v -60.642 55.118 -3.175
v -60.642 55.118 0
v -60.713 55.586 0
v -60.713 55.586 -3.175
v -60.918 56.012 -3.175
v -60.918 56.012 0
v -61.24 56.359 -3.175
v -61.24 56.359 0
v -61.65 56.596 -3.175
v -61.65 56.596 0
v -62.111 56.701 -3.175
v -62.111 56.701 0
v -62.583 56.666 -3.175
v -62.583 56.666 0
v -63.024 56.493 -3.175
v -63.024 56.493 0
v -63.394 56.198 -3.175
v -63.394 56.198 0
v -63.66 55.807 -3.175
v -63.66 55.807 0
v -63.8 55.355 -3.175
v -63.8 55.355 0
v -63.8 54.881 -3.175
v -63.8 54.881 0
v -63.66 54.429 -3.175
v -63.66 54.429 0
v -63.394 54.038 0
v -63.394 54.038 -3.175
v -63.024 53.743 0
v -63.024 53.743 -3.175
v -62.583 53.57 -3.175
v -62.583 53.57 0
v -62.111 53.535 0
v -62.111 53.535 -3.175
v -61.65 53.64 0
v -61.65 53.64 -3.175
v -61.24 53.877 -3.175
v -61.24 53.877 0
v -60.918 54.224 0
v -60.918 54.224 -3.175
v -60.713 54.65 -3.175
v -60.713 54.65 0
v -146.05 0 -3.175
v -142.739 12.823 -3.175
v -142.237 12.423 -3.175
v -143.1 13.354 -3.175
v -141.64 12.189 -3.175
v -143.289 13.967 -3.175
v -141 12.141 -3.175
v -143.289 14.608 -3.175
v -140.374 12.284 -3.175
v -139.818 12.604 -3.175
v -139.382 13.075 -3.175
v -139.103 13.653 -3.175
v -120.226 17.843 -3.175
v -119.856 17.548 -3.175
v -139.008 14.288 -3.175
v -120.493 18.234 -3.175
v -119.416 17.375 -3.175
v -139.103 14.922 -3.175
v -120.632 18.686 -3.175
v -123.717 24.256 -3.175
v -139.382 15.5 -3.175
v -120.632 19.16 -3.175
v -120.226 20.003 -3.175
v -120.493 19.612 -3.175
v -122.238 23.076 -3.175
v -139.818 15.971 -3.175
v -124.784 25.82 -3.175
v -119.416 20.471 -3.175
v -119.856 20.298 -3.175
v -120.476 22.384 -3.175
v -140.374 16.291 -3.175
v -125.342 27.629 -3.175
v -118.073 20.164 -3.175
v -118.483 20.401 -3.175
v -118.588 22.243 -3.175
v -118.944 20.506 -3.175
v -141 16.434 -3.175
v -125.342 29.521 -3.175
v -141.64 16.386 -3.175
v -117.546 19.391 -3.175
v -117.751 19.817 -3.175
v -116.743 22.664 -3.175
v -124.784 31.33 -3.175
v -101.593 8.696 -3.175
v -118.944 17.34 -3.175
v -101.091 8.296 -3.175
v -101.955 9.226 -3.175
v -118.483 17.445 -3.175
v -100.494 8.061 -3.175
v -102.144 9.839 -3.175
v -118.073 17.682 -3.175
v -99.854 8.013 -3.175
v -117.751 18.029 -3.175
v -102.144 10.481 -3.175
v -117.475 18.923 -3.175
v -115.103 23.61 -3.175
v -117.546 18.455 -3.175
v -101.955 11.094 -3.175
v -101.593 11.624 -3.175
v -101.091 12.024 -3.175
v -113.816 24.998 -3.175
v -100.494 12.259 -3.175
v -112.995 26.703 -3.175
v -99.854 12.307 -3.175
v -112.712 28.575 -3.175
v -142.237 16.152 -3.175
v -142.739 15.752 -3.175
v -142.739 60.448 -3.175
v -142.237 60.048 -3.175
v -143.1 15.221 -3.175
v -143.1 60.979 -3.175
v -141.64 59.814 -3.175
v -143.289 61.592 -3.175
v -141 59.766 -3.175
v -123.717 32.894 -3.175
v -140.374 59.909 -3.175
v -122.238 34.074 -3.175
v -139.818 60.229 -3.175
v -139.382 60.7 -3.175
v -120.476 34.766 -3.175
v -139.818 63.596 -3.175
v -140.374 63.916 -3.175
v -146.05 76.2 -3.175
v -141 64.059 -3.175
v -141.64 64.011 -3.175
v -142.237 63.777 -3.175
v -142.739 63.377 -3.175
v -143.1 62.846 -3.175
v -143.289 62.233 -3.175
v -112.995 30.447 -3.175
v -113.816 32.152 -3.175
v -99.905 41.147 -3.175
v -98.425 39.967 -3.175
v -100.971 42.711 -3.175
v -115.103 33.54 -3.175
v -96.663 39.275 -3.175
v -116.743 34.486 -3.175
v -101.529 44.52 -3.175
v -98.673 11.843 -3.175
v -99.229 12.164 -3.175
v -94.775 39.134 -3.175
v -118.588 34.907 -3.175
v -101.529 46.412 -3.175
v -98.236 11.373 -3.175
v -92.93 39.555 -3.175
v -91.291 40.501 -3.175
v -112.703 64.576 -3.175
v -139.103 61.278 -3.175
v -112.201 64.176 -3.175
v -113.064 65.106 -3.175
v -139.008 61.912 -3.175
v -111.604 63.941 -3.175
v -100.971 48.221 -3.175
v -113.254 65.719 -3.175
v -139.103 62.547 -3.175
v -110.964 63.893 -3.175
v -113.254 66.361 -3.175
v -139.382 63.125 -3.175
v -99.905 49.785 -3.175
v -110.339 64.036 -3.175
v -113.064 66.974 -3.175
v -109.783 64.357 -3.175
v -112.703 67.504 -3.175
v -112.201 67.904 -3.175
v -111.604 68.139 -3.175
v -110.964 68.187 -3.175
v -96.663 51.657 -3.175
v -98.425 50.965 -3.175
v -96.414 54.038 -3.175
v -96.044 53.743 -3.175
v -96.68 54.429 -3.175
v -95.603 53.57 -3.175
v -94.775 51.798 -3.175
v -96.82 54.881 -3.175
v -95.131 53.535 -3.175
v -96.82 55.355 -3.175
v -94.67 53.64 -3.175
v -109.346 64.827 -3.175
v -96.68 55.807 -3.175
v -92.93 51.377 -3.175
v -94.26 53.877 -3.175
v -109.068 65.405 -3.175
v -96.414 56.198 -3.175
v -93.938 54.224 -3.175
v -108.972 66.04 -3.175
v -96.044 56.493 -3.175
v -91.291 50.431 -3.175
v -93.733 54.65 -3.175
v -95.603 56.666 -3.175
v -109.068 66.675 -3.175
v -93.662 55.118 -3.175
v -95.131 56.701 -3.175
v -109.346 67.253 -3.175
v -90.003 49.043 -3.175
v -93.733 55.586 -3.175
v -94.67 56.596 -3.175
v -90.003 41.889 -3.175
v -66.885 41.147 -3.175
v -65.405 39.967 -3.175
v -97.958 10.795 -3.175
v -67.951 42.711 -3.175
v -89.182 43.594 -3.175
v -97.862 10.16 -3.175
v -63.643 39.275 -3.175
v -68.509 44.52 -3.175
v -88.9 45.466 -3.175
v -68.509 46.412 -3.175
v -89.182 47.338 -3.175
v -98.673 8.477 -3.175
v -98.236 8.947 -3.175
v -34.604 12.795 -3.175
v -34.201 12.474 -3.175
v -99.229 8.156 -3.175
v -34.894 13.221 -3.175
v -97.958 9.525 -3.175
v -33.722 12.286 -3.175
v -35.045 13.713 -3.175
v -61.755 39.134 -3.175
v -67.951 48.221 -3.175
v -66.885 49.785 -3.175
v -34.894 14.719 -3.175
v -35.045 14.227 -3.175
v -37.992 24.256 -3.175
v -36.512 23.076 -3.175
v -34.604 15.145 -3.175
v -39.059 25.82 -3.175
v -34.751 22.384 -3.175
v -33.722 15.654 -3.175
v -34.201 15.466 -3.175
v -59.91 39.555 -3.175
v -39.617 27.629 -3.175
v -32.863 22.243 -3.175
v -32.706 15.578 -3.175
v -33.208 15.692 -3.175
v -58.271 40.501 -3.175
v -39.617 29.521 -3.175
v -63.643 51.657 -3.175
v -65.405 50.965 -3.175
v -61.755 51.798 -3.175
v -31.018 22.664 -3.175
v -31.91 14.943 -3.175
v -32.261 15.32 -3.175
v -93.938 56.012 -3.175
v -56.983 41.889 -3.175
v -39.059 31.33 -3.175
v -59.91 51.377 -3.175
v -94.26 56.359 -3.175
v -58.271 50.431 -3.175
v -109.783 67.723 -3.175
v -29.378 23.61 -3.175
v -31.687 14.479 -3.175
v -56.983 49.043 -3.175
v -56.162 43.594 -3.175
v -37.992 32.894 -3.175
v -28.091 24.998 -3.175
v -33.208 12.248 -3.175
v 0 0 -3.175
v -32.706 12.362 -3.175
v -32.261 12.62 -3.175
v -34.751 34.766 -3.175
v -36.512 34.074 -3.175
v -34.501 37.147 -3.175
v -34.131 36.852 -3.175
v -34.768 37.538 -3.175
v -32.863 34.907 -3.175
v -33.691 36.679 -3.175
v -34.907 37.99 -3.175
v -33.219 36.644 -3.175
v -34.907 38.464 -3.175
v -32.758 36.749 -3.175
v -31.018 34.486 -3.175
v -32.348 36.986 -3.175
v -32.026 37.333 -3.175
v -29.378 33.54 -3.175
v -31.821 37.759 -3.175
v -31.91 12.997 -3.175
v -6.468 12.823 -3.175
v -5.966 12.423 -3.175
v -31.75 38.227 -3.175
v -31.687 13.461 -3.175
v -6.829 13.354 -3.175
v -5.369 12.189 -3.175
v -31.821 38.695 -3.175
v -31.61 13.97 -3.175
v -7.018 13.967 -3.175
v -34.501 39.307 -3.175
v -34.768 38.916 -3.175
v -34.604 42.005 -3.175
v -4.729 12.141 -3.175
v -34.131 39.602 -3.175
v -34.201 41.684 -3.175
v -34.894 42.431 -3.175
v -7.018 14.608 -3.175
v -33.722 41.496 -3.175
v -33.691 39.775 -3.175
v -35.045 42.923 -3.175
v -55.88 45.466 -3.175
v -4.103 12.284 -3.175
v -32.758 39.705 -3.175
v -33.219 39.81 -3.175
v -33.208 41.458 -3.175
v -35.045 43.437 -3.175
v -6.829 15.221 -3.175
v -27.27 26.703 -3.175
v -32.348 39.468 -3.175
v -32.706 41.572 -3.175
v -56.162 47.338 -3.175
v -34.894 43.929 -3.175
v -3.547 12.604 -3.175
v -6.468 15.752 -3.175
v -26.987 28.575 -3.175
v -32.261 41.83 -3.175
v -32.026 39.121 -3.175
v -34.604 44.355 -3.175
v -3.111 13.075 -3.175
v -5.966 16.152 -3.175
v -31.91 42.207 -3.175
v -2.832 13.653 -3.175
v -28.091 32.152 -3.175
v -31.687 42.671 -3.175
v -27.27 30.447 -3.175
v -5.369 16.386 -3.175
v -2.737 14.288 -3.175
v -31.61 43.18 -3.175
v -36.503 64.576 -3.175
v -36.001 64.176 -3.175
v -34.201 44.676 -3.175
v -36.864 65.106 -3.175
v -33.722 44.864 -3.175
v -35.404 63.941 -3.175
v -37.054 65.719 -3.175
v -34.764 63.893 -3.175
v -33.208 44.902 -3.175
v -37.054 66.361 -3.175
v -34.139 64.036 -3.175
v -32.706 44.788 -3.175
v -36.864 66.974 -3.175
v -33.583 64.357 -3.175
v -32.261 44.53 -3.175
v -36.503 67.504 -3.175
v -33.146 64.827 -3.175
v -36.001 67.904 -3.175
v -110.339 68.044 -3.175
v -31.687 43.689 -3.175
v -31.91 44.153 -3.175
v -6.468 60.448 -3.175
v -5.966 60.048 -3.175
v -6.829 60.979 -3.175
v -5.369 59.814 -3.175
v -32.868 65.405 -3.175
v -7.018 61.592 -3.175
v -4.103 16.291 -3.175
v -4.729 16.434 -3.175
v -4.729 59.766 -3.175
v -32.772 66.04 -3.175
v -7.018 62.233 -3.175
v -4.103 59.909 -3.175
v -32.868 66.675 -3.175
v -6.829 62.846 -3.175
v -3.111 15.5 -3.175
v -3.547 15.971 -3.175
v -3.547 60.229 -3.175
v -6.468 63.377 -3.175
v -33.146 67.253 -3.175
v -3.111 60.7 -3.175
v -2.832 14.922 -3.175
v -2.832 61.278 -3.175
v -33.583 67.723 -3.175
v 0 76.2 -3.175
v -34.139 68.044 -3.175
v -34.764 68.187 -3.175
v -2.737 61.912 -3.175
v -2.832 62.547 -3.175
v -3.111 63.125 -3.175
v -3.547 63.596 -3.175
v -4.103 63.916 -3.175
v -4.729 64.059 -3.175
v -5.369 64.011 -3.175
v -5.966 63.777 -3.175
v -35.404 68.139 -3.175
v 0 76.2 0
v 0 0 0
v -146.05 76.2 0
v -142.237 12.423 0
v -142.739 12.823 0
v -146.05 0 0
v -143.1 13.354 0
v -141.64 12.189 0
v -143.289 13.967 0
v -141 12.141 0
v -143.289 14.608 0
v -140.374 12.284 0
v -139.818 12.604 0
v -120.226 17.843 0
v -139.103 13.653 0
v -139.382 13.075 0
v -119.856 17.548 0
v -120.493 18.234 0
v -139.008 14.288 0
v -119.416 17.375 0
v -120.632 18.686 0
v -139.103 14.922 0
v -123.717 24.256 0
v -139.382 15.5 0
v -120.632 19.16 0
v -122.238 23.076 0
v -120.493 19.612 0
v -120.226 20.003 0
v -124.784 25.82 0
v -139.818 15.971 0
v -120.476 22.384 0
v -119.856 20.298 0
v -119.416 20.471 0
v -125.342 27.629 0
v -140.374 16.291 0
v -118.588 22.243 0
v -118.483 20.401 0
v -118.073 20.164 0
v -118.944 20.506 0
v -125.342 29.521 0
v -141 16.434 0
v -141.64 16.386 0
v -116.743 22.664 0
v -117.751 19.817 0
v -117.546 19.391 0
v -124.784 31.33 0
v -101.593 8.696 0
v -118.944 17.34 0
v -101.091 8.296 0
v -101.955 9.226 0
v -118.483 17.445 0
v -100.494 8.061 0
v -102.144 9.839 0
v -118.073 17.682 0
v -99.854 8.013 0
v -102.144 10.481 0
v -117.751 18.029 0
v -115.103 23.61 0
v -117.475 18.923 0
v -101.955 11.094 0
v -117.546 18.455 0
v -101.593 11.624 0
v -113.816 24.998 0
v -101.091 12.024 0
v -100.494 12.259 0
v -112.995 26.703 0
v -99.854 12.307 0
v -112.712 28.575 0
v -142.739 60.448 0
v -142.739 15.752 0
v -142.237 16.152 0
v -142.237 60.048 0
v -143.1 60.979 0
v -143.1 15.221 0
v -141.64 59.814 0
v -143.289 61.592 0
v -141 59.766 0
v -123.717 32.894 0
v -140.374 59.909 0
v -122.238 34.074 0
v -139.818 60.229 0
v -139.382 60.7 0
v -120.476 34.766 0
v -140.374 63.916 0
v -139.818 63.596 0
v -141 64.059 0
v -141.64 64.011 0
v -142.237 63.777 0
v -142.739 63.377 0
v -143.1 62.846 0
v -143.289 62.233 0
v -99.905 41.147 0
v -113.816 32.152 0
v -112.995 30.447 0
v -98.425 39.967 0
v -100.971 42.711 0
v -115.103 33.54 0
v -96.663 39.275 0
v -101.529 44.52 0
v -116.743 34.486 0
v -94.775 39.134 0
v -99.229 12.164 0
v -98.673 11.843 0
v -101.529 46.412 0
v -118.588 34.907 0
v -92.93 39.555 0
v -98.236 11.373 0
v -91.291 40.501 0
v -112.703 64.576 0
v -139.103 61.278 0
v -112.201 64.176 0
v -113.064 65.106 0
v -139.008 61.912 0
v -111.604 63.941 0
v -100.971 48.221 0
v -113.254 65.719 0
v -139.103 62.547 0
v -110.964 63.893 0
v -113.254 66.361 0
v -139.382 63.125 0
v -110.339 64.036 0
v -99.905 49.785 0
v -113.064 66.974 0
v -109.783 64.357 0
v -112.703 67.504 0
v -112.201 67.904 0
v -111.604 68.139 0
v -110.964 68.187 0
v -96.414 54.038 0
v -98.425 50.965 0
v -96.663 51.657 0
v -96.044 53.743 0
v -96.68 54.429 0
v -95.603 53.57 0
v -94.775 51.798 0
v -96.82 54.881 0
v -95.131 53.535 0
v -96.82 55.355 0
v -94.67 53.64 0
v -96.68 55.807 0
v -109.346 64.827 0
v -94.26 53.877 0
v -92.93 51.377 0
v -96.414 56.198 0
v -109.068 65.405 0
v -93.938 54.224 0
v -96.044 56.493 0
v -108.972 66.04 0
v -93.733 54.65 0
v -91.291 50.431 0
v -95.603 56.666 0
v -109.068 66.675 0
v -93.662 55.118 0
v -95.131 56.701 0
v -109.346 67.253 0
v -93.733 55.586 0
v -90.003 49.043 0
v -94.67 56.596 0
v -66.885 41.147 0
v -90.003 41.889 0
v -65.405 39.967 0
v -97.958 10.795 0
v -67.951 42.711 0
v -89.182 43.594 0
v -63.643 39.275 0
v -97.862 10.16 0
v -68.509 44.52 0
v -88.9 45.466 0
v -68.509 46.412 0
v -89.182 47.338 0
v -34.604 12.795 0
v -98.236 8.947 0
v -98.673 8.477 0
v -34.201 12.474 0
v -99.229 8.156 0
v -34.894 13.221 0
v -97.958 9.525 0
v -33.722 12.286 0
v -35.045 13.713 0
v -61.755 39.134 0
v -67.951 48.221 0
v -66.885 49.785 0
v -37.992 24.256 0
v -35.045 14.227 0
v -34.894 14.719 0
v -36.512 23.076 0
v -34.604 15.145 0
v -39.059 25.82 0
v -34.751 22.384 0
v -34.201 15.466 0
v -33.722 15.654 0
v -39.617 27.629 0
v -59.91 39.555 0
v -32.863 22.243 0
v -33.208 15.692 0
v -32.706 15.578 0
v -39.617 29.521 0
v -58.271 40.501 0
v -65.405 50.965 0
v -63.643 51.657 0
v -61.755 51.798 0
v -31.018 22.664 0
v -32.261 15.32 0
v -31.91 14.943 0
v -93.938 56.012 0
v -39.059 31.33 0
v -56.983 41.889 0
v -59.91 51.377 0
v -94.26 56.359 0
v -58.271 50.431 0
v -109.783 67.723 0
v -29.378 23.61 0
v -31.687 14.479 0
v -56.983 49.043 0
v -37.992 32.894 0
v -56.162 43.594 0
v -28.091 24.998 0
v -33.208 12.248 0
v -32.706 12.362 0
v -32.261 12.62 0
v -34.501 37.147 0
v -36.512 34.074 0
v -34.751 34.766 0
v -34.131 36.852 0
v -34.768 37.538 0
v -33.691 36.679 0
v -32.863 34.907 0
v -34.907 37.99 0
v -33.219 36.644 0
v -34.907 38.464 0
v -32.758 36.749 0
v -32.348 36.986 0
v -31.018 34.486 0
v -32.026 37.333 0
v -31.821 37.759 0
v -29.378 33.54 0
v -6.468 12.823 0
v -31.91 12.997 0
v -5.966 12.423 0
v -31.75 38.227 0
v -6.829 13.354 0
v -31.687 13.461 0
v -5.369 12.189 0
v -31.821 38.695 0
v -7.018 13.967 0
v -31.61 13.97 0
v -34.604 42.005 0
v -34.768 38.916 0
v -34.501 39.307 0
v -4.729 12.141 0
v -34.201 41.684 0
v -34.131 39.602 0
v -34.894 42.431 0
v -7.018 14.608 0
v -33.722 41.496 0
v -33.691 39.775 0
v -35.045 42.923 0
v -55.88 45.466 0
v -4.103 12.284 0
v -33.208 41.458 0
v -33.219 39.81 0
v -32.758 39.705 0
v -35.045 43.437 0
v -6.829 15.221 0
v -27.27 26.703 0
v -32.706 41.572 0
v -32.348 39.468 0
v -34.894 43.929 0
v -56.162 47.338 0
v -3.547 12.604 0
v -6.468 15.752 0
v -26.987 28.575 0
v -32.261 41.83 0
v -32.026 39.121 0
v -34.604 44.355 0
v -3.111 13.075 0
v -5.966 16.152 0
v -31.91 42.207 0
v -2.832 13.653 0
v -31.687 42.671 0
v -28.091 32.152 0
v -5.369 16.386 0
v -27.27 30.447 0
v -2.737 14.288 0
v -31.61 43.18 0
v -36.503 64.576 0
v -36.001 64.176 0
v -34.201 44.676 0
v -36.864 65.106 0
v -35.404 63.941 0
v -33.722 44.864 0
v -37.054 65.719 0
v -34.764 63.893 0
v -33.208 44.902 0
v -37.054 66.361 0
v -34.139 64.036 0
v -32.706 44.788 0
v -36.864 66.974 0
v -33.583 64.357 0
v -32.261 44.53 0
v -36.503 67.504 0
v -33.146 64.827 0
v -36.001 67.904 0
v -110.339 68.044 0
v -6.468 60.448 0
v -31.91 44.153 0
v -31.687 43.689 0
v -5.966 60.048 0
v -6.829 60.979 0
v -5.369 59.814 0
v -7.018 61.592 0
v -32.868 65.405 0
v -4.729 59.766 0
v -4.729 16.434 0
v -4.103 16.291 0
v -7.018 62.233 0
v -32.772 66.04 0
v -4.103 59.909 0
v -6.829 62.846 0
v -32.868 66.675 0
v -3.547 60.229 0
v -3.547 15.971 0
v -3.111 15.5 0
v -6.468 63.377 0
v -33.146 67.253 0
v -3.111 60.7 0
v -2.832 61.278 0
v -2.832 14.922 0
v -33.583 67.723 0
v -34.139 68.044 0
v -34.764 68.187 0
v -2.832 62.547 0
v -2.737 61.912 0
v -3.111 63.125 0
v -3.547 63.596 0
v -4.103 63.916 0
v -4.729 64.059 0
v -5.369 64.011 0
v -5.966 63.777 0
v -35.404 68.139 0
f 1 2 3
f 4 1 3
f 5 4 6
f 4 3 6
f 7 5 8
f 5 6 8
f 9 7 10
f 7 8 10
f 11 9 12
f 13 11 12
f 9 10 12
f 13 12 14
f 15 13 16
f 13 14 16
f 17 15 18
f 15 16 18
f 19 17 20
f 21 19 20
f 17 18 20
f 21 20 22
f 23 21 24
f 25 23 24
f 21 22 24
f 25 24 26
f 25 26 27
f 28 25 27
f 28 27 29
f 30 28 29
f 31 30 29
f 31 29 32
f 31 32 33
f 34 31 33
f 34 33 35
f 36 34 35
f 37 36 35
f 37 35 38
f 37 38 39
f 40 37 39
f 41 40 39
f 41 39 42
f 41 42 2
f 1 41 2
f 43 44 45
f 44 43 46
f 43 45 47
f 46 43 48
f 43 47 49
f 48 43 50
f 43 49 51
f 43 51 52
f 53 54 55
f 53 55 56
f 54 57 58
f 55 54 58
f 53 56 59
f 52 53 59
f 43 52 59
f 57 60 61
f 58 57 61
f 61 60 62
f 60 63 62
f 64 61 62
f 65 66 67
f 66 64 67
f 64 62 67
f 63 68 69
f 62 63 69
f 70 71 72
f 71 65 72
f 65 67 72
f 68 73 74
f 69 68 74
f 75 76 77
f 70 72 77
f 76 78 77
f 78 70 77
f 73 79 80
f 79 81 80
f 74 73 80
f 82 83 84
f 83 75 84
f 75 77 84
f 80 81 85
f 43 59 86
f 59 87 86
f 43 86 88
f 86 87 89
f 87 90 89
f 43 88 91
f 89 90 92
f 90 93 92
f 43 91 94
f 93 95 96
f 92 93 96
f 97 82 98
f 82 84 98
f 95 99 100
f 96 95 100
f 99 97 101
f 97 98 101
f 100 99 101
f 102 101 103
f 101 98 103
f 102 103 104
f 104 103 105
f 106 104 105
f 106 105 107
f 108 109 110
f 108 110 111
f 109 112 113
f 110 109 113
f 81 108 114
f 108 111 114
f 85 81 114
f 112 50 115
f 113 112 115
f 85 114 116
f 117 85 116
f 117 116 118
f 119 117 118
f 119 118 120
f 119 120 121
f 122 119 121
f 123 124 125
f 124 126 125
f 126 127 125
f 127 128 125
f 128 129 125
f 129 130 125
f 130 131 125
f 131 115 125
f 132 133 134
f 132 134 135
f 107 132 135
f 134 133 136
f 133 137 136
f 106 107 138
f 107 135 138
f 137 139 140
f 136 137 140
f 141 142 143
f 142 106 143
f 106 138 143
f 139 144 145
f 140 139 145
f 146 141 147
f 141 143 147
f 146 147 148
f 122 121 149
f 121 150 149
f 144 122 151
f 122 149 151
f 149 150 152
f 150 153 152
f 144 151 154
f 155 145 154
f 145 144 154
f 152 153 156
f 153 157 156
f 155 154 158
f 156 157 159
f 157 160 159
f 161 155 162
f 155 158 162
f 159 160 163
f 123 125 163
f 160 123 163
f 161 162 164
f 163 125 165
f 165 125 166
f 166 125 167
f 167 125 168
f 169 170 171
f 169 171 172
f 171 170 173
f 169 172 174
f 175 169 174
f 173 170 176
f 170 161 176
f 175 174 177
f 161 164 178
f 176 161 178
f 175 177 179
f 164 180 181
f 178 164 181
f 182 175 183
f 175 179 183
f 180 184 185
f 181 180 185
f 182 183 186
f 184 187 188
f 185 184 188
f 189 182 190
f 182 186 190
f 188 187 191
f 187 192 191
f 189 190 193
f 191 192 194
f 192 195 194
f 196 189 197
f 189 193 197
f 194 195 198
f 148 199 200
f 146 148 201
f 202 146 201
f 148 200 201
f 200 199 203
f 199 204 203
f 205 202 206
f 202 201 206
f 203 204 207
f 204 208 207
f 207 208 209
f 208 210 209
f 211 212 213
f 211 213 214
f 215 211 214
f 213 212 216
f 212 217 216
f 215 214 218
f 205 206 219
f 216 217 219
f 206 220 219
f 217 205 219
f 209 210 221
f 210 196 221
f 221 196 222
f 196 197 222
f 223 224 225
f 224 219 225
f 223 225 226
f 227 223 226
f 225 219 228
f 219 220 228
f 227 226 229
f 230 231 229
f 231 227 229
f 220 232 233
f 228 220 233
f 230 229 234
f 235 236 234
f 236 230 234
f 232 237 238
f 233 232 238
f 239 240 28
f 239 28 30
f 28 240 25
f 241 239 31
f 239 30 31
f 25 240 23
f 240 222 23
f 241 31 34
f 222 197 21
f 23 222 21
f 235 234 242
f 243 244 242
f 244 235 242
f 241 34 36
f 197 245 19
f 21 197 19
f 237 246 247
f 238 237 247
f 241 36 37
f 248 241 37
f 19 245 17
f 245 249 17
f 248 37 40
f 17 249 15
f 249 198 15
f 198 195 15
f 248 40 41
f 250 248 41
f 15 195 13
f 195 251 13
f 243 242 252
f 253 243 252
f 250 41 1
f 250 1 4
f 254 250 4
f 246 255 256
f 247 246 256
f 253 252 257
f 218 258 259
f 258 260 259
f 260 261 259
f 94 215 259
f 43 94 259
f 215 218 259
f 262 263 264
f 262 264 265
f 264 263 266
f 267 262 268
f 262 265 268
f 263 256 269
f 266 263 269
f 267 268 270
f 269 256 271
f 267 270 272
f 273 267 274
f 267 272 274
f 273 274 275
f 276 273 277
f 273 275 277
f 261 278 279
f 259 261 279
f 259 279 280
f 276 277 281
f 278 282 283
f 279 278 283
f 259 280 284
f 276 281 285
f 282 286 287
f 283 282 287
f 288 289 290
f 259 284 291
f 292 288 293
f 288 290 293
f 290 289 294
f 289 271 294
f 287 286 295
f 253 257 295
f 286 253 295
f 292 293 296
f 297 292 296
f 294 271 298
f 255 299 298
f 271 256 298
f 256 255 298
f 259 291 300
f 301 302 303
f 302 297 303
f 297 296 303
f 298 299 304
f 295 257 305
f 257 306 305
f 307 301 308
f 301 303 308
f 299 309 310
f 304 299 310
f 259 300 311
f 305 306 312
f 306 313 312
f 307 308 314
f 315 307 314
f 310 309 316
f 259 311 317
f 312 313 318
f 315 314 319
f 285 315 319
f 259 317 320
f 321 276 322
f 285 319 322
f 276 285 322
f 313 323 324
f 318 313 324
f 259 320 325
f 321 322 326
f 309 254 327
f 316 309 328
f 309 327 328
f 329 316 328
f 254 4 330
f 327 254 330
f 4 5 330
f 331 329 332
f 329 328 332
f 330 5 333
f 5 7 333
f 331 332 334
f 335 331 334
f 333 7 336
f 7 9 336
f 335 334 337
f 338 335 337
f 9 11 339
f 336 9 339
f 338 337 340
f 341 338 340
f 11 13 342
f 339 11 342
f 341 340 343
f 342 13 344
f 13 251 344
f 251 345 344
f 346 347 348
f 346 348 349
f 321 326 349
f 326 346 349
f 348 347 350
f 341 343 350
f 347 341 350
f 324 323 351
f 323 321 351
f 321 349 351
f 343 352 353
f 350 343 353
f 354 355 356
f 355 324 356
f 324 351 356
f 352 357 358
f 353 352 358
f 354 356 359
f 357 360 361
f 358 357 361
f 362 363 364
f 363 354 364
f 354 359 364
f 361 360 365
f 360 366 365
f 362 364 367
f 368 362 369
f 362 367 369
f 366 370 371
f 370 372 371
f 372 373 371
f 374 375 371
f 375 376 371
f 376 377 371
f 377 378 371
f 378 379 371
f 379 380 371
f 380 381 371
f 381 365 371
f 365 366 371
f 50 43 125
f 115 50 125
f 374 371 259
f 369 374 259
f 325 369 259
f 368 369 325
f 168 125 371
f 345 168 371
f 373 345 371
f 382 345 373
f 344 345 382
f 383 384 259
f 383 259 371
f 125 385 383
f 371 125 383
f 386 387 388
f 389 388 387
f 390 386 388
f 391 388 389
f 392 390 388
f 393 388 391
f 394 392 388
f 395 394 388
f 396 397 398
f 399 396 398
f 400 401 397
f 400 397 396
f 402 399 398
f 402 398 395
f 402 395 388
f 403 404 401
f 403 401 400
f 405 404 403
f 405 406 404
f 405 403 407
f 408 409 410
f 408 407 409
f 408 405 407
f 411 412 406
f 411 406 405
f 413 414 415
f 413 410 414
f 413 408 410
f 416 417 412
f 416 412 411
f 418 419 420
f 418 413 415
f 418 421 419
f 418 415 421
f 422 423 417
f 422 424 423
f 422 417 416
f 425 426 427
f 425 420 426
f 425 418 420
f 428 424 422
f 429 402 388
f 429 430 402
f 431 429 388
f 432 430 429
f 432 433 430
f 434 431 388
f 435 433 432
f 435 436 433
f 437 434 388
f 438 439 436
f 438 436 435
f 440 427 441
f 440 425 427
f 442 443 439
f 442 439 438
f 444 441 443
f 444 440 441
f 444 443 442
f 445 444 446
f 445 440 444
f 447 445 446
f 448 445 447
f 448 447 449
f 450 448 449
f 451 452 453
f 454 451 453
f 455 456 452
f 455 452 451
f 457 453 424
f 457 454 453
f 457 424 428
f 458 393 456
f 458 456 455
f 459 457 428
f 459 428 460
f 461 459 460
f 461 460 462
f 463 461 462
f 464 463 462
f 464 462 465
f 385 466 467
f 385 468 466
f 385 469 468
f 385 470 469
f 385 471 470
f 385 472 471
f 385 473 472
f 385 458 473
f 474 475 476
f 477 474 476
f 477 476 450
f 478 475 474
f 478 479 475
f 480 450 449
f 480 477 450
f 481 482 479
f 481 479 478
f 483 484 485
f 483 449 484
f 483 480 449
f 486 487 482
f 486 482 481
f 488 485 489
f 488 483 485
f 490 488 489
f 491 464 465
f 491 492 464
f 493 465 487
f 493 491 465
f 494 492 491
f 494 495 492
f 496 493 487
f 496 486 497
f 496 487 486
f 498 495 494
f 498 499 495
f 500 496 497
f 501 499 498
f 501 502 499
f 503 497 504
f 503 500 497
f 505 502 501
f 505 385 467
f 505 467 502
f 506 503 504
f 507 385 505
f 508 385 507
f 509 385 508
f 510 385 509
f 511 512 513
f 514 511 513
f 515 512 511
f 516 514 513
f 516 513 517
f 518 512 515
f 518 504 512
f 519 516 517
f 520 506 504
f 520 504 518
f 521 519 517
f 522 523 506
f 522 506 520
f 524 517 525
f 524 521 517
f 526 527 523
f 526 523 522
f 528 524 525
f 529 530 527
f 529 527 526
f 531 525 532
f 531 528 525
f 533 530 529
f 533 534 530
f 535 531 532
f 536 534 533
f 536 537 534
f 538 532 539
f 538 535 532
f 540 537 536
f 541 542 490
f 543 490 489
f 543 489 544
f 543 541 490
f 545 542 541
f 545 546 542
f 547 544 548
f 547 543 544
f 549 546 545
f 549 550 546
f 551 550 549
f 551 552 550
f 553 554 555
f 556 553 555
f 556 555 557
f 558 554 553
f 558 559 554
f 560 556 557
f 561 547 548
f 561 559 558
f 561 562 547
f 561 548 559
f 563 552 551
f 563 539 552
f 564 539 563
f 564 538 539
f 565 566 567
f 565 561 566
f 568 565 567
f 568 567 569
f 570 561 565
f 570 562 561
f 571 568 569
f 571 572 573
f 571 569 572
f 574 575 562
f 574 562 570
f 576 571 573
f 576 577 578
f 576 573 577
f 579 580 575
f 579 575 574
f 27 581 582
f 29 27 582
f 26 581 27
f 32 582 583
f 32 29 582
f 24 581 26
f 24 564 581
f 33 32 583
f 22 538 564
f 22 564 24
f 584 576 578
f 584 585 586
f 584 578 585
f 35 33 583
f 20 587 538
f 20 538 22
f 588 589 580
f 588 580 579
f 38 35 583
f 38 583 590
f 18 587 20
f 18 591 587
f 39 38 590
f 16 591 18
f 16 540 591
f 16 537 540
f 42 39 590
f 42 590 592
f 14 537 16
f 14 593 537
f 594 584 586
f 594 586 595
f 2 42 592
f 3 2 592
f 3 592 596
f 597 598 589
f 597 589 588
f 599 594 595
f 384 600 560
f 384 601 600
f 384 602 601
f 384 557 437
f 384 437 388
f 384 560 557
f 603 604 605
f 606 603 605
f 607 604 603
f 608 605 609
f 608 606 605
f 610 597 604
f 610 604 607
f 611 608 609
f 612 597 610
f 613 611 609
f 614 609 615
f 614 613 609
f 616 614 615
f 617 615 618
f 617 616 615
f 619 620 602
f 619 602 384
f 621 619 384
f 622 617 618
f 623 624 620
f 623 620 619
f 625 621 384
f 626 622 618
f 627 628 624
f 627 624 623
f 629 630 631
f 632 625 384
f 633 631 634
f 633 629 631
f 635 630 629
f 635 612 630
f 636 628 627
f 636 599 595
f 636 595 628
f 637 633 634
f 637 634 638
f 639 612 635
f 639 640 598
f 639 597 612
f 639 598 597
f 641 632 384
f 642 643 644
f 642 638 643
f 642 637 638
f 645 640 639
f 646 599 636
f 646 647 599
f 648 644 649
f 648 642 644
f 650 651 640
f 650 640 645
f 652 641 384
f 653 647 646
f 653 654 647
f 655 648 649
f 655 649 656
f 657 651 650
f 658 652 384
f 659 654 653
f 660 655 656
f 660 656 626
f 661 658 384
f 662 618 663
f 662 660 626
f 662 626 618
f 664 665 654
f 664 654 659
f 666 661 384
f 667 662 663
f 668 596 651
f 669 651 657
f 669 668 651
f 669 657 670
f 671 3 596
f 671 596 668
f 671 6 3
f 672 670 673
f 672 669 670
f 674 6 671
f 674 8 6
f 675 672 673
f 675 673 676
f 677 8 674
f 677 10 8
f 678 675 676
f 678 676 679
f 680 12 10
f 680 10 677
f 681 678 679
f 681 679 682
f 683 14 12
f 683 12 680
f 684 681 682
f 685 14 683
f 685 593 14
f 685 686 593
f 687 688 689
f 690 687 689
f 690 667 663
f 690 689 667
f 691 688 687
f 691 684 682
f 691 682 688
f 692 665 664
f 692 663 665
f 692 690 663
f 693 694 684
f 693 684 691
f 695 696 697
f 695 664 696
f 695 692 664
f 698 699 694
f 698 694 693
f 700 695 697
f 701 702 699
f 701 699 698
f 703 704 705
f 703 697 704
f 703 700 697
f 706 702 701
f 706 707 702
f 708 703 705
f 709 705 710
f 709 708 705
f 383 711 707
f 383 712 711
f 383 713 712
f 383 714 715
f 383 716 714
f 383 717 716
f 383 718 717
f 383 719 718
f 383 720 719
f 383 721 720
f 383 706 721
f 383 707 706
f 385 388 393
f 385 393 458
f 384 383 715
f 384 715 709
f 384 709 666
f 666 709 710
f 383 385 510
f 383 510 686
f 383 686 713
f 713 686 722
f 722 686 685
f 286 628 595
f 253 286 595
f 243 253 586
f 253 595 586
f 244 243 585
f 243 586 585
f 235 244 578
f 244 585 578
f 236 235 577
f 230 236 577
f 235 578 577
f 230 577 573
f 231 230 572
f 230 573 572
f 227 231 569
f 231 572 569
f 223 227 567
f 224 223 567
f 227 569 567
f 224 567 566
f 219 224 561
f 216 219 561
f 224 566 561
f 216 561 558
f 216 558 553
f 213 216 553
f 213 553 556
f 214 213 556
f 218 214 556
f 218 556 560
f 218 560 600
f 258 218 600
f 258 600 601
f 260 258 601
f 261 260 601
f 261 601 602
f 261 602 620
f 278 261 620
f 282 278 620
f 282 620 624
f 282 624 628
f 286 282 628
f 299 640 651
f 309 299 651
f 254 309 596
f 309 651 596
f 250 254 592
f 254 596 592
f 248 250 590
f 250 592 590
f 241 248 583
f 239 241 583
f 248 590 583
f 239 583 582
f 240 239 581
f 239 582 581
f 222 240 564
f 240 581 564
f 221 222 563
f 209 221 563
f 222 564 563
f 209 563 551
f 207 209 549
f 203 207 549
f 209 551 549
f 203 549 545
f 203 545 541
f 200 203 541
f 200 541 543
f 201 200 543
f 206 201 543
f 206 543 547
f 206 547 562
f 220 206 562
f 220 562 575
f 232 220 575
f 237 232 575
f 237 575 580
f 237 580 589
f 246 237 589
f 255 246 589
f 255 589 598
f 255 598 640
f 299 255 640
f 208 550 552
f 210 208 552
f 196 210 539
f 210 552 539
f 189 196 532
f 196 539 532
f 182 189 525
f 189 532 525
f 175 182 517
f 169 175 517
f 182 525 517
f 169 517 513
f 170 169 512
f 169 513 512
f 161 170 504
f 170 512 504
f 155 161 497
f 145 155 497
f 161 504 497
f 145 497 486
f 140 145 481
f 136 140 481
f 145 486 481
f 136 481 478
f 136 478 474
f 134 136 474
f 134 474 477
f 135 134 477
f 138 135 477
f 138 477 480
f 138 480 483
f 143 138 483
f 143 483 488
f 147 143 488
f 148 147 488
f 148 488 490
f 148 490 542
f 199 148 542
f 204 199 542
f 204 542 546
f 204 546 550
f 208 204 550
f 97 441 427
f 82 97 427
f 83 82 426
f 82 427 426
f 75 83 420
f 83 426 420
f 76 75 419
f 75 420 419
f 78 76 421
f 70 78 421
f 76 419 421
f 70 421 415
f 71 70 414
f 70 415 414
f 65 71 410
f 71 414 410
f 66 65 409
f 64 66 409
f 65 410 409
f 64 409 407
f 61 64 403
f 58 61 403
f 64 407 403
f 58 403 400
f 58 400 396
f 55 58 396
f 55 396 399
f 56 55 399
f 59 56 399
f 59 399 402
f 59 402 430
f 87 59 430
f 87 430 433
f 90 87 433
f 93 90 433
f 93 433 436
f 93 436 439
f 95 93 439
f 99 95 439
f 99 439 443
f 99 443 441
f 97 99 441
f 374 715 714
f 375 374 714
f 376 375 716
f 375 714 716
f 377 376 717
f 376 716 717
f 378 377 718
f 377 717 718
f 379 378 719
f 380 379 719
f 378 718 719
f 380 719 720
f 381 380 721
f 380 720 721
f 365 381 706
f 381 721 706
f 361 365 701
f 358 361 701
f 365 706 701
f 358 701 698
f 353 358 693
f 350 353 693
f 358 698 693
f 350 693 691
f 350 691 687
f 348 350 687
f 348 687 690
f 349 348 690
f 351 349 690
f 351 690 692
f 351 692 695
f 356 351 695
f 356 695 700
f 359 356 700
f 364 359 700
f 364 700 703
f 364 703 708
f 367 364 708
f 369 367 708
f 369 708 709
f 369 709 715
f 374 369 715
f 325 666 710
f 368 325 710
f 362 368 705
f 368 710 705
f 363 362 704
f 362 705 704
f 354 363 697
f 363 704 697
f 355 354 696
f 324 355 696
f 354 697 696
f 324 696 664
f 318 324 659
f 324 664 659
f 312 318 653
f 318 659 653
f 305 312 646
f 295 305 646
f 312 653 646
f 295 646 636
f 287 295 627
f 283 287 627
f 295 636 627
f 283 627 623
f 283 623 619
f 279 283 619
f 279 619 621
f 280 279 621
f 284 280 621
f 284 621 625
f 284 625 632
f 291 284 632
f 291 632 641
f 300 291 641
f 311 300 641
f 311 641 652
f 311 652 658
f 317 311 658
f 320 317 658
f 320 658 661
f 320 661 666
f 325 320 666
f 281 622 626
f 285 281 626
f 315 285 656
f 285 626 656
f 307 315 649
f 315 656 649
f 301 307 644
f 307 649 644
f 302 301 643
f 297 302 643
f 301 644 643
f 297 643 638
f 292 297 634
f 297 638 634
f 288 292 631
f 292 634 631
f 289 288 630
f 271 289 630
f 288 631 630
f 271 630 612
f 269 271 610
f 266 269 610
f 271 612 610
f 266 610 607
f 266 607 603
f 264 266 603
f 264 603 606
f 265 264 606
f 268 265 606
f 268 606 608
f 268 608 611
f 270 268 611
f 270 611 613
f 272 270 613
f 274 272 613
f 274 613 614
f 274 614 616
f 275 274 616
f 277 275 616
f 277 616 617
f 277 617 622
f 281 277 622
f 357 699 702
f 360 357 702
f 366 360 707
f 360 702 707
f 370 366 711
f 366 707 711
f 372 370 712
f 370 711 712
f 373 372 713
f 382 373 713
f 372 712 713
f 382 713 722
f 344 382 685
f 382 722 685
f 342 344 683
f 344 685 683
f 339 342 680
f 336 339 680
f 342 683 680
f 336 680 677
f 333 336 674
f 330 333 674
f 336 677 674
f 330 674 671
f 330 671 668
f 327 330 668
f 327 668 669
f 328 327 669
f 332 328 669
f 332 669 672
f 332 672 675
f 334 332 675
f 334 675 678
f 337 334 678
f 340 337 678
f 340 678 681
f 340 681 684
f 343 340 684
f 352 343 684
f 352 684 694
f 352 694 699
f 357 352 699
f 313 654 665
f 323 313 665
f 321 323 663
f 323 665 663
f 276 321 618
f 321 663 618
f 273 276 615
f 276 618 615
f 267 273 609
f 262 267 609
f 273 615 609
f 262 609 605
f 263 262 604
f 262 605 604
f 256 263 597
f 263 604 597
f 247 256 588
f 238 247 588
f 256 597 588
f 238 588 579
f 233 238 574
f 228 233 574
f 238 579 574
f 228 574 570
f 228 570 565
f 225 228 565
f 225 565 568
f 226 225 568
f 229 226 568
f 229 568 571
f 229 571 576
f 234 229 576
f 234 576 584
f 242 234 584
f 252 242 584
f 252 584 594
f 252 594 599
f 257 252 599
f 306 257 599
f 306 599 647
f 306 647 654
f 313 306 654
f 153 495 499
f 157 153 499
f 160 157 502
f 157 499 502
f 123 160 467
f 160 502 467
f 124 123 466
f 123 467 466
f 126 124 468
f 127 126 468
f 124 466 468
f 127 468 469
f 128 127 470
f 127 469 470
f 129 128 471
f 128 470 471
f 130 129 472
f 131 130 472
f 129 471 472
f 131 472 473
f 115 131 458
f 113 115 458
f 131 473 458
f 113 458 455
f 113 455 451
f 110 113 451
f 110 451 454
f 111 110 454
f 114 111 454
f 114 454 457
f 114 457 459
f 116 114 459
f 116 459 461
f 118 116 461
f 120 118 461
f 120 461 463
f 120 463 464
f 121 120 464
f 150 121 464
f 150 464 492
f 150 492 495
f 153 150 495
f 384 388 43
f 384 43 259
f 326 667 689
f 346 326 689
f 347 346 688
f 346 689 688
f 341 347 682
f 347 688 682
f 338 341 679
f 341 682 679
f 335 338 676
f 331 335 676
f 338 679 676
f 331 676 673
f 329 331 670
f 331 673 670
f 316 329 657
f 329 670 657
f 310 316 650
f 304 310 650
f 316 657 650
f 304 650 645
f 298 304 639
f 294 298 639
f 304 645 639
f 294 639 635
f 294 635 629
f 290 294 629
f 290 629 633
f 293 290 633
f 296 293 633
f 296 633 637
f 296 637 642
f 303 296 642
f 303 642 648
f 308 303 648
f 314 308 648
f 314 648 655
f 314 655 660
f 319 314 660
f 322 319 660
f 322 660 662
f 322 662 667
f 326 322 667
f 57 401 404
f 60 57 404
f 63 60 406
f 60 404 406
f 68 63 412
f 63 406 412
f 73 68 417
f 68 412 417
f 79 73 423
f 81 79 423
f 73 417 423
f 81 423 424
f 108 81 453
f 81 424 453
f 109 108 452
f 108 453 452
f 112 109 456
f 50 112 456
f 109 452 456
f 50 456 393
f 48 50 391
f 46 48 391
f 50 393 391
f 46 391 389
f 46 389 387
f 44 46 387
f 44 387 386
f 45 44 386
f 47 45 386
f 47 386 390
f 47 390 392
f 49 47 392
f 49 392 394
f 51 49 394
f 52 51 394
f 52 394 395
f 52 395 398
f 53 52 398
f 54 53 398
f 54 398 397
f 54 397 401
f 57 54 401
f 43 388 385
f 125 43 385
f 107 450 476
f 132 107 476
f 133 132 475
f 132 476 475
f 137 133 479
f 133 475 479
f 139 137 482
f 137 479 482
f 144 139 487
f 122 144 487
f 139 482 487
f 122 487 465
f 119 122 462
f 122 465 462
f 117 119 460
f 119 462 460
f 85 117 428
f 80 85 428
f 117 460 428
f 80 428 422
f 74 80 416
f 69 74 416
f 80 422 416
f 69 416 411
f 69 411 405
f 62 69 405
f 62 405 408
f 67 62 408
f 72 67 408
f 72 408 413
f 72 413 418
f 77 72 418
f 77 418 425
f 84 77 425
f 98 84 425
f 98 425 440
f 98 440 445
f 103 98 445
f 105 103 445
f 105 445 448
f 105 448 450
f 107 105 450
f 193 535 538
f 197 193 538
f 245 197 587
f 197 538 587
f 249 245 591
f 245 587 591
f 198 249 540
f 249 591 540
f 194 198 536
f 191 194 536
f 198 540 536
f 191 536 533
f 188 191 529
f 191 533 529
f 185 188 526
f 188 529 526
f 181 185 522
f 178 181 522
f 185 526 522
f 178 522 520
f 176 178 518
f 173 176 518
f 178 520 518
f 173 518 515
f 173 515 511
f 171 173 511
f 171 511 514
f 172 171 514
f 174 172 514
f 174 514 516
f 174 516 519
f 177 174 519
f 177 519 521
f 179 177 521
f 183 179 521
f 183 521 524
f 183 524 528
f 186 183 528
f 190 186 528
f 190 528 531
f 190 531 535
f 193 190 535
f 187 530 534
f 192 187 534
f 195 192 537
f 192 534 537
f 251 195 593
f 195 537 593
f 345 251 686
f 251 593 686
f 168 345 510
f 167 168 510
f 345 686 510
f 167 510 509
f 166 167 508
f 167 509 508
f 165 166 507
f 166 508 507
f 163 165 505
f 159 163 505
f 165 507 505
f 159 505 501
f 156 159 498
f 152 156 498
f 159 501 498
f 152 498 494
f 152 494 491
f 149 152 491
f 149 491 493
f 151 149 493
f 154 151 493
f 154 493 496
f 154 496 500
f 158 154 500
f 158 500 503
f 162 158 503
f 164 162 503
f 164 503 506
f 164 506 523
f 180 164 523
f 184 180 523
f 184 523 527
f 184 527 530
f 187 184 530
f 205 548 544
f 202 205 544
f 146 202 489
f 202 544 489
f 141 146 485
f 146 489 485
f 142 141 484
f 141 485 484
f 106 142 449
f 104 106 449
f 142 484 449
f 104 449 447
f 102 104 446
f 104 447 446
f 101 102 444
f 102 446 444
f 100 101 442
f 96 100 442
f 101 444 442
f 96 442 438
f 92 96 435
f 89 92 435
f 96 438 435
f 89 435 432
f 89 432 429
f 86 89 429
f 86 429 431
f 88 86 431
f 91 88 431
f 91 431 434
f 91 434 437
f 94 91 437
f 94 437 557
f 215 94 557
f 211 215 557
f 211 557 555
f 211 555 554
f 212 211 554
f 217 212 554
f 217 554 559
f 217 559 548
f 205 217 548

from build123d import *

# Parameters (mm, degrees)
SKETCH1_W                    = 146.05
SKETCH1_H                    = 76.2
BOSS_EXTRUDE1_DEPTH          = 3.175
F_1_8_0_125_DIAMETER_HOLE1_D = 3.175
F_1_2_0_5_DIAMETER_HOLE1_D   = 12.7
F_6_CLEARANCE_HOLE1_D        = 4.3053
F_4_CLEARANCE_HOLE1_D        = 3.4544


with BuildPart() as part:
    # Sketch1 → Boss-Extrude1 (new body)
    with BuildSketch(Plane.XY):
        with Locations((-73.025, 38.1)):
            Rectangle(SKETCH1_W, SKETCH1_H)
    extrude(amount=-BOSS_EXTRUDE1_DEPTH)

    # 1/8 (0.125) Diameter Hole1 (through all)
    with Locations(Plane(origin=(0, 0, -3.175), x_dir=(-1, 0, 0), z_dir=(0, 0, -1))):
        with Locations((95.25, 55.118), (119.0625, 18.923), (62.23, 55.118), (33.3375, 38.227)):
            Hole(F_1_8_0_125_DIAMETER_HOLE1_D / 2)

    # 1/2 (0.5) Diameter Hole1 (through all)
    with Locations(Plane(origin=(0, 0, -3.175), x_dir=(-1, 0, 0), z_dir=(0, 0, -1))):
        with Locations((95.25, 45.466), (119.0625, 28.575), (62.23, 45.466), (33.3375, 28.575)):
            Hole(F_1_2_0_5_DIAMETER_HOLE1_D / 2)

    # #6 Clearance Hole1 (through all)
    with Locations(Plane(origin=(0, 0, -3.175), x_dir=(-1, 0, 0), z_dir=(0, 0, -1))):
        with Locations((141.1605, 61.9125), (141.1605, 14.2875), (4.8895, 61.9125), (4.8895, 14.2875), (111.125, 66.04), (100.01504, 10.16), (34.925, 66.04)):
            Hole(F_6_CLEARANCE_HOLE1_D / 2)

    # #4 Clearance Hole1 (through all)
    with Locations(Plane(origin=(0, 0, -3.175), x_dir=(-1, 0, 0), z_dir=(0, 0, -1))):
        with Locations((33.3375, 43.18), (33.3375, 13.97)):
            Hole(F_4_CLEARANCE_HOLE1_D / 2)


solid = part.part
